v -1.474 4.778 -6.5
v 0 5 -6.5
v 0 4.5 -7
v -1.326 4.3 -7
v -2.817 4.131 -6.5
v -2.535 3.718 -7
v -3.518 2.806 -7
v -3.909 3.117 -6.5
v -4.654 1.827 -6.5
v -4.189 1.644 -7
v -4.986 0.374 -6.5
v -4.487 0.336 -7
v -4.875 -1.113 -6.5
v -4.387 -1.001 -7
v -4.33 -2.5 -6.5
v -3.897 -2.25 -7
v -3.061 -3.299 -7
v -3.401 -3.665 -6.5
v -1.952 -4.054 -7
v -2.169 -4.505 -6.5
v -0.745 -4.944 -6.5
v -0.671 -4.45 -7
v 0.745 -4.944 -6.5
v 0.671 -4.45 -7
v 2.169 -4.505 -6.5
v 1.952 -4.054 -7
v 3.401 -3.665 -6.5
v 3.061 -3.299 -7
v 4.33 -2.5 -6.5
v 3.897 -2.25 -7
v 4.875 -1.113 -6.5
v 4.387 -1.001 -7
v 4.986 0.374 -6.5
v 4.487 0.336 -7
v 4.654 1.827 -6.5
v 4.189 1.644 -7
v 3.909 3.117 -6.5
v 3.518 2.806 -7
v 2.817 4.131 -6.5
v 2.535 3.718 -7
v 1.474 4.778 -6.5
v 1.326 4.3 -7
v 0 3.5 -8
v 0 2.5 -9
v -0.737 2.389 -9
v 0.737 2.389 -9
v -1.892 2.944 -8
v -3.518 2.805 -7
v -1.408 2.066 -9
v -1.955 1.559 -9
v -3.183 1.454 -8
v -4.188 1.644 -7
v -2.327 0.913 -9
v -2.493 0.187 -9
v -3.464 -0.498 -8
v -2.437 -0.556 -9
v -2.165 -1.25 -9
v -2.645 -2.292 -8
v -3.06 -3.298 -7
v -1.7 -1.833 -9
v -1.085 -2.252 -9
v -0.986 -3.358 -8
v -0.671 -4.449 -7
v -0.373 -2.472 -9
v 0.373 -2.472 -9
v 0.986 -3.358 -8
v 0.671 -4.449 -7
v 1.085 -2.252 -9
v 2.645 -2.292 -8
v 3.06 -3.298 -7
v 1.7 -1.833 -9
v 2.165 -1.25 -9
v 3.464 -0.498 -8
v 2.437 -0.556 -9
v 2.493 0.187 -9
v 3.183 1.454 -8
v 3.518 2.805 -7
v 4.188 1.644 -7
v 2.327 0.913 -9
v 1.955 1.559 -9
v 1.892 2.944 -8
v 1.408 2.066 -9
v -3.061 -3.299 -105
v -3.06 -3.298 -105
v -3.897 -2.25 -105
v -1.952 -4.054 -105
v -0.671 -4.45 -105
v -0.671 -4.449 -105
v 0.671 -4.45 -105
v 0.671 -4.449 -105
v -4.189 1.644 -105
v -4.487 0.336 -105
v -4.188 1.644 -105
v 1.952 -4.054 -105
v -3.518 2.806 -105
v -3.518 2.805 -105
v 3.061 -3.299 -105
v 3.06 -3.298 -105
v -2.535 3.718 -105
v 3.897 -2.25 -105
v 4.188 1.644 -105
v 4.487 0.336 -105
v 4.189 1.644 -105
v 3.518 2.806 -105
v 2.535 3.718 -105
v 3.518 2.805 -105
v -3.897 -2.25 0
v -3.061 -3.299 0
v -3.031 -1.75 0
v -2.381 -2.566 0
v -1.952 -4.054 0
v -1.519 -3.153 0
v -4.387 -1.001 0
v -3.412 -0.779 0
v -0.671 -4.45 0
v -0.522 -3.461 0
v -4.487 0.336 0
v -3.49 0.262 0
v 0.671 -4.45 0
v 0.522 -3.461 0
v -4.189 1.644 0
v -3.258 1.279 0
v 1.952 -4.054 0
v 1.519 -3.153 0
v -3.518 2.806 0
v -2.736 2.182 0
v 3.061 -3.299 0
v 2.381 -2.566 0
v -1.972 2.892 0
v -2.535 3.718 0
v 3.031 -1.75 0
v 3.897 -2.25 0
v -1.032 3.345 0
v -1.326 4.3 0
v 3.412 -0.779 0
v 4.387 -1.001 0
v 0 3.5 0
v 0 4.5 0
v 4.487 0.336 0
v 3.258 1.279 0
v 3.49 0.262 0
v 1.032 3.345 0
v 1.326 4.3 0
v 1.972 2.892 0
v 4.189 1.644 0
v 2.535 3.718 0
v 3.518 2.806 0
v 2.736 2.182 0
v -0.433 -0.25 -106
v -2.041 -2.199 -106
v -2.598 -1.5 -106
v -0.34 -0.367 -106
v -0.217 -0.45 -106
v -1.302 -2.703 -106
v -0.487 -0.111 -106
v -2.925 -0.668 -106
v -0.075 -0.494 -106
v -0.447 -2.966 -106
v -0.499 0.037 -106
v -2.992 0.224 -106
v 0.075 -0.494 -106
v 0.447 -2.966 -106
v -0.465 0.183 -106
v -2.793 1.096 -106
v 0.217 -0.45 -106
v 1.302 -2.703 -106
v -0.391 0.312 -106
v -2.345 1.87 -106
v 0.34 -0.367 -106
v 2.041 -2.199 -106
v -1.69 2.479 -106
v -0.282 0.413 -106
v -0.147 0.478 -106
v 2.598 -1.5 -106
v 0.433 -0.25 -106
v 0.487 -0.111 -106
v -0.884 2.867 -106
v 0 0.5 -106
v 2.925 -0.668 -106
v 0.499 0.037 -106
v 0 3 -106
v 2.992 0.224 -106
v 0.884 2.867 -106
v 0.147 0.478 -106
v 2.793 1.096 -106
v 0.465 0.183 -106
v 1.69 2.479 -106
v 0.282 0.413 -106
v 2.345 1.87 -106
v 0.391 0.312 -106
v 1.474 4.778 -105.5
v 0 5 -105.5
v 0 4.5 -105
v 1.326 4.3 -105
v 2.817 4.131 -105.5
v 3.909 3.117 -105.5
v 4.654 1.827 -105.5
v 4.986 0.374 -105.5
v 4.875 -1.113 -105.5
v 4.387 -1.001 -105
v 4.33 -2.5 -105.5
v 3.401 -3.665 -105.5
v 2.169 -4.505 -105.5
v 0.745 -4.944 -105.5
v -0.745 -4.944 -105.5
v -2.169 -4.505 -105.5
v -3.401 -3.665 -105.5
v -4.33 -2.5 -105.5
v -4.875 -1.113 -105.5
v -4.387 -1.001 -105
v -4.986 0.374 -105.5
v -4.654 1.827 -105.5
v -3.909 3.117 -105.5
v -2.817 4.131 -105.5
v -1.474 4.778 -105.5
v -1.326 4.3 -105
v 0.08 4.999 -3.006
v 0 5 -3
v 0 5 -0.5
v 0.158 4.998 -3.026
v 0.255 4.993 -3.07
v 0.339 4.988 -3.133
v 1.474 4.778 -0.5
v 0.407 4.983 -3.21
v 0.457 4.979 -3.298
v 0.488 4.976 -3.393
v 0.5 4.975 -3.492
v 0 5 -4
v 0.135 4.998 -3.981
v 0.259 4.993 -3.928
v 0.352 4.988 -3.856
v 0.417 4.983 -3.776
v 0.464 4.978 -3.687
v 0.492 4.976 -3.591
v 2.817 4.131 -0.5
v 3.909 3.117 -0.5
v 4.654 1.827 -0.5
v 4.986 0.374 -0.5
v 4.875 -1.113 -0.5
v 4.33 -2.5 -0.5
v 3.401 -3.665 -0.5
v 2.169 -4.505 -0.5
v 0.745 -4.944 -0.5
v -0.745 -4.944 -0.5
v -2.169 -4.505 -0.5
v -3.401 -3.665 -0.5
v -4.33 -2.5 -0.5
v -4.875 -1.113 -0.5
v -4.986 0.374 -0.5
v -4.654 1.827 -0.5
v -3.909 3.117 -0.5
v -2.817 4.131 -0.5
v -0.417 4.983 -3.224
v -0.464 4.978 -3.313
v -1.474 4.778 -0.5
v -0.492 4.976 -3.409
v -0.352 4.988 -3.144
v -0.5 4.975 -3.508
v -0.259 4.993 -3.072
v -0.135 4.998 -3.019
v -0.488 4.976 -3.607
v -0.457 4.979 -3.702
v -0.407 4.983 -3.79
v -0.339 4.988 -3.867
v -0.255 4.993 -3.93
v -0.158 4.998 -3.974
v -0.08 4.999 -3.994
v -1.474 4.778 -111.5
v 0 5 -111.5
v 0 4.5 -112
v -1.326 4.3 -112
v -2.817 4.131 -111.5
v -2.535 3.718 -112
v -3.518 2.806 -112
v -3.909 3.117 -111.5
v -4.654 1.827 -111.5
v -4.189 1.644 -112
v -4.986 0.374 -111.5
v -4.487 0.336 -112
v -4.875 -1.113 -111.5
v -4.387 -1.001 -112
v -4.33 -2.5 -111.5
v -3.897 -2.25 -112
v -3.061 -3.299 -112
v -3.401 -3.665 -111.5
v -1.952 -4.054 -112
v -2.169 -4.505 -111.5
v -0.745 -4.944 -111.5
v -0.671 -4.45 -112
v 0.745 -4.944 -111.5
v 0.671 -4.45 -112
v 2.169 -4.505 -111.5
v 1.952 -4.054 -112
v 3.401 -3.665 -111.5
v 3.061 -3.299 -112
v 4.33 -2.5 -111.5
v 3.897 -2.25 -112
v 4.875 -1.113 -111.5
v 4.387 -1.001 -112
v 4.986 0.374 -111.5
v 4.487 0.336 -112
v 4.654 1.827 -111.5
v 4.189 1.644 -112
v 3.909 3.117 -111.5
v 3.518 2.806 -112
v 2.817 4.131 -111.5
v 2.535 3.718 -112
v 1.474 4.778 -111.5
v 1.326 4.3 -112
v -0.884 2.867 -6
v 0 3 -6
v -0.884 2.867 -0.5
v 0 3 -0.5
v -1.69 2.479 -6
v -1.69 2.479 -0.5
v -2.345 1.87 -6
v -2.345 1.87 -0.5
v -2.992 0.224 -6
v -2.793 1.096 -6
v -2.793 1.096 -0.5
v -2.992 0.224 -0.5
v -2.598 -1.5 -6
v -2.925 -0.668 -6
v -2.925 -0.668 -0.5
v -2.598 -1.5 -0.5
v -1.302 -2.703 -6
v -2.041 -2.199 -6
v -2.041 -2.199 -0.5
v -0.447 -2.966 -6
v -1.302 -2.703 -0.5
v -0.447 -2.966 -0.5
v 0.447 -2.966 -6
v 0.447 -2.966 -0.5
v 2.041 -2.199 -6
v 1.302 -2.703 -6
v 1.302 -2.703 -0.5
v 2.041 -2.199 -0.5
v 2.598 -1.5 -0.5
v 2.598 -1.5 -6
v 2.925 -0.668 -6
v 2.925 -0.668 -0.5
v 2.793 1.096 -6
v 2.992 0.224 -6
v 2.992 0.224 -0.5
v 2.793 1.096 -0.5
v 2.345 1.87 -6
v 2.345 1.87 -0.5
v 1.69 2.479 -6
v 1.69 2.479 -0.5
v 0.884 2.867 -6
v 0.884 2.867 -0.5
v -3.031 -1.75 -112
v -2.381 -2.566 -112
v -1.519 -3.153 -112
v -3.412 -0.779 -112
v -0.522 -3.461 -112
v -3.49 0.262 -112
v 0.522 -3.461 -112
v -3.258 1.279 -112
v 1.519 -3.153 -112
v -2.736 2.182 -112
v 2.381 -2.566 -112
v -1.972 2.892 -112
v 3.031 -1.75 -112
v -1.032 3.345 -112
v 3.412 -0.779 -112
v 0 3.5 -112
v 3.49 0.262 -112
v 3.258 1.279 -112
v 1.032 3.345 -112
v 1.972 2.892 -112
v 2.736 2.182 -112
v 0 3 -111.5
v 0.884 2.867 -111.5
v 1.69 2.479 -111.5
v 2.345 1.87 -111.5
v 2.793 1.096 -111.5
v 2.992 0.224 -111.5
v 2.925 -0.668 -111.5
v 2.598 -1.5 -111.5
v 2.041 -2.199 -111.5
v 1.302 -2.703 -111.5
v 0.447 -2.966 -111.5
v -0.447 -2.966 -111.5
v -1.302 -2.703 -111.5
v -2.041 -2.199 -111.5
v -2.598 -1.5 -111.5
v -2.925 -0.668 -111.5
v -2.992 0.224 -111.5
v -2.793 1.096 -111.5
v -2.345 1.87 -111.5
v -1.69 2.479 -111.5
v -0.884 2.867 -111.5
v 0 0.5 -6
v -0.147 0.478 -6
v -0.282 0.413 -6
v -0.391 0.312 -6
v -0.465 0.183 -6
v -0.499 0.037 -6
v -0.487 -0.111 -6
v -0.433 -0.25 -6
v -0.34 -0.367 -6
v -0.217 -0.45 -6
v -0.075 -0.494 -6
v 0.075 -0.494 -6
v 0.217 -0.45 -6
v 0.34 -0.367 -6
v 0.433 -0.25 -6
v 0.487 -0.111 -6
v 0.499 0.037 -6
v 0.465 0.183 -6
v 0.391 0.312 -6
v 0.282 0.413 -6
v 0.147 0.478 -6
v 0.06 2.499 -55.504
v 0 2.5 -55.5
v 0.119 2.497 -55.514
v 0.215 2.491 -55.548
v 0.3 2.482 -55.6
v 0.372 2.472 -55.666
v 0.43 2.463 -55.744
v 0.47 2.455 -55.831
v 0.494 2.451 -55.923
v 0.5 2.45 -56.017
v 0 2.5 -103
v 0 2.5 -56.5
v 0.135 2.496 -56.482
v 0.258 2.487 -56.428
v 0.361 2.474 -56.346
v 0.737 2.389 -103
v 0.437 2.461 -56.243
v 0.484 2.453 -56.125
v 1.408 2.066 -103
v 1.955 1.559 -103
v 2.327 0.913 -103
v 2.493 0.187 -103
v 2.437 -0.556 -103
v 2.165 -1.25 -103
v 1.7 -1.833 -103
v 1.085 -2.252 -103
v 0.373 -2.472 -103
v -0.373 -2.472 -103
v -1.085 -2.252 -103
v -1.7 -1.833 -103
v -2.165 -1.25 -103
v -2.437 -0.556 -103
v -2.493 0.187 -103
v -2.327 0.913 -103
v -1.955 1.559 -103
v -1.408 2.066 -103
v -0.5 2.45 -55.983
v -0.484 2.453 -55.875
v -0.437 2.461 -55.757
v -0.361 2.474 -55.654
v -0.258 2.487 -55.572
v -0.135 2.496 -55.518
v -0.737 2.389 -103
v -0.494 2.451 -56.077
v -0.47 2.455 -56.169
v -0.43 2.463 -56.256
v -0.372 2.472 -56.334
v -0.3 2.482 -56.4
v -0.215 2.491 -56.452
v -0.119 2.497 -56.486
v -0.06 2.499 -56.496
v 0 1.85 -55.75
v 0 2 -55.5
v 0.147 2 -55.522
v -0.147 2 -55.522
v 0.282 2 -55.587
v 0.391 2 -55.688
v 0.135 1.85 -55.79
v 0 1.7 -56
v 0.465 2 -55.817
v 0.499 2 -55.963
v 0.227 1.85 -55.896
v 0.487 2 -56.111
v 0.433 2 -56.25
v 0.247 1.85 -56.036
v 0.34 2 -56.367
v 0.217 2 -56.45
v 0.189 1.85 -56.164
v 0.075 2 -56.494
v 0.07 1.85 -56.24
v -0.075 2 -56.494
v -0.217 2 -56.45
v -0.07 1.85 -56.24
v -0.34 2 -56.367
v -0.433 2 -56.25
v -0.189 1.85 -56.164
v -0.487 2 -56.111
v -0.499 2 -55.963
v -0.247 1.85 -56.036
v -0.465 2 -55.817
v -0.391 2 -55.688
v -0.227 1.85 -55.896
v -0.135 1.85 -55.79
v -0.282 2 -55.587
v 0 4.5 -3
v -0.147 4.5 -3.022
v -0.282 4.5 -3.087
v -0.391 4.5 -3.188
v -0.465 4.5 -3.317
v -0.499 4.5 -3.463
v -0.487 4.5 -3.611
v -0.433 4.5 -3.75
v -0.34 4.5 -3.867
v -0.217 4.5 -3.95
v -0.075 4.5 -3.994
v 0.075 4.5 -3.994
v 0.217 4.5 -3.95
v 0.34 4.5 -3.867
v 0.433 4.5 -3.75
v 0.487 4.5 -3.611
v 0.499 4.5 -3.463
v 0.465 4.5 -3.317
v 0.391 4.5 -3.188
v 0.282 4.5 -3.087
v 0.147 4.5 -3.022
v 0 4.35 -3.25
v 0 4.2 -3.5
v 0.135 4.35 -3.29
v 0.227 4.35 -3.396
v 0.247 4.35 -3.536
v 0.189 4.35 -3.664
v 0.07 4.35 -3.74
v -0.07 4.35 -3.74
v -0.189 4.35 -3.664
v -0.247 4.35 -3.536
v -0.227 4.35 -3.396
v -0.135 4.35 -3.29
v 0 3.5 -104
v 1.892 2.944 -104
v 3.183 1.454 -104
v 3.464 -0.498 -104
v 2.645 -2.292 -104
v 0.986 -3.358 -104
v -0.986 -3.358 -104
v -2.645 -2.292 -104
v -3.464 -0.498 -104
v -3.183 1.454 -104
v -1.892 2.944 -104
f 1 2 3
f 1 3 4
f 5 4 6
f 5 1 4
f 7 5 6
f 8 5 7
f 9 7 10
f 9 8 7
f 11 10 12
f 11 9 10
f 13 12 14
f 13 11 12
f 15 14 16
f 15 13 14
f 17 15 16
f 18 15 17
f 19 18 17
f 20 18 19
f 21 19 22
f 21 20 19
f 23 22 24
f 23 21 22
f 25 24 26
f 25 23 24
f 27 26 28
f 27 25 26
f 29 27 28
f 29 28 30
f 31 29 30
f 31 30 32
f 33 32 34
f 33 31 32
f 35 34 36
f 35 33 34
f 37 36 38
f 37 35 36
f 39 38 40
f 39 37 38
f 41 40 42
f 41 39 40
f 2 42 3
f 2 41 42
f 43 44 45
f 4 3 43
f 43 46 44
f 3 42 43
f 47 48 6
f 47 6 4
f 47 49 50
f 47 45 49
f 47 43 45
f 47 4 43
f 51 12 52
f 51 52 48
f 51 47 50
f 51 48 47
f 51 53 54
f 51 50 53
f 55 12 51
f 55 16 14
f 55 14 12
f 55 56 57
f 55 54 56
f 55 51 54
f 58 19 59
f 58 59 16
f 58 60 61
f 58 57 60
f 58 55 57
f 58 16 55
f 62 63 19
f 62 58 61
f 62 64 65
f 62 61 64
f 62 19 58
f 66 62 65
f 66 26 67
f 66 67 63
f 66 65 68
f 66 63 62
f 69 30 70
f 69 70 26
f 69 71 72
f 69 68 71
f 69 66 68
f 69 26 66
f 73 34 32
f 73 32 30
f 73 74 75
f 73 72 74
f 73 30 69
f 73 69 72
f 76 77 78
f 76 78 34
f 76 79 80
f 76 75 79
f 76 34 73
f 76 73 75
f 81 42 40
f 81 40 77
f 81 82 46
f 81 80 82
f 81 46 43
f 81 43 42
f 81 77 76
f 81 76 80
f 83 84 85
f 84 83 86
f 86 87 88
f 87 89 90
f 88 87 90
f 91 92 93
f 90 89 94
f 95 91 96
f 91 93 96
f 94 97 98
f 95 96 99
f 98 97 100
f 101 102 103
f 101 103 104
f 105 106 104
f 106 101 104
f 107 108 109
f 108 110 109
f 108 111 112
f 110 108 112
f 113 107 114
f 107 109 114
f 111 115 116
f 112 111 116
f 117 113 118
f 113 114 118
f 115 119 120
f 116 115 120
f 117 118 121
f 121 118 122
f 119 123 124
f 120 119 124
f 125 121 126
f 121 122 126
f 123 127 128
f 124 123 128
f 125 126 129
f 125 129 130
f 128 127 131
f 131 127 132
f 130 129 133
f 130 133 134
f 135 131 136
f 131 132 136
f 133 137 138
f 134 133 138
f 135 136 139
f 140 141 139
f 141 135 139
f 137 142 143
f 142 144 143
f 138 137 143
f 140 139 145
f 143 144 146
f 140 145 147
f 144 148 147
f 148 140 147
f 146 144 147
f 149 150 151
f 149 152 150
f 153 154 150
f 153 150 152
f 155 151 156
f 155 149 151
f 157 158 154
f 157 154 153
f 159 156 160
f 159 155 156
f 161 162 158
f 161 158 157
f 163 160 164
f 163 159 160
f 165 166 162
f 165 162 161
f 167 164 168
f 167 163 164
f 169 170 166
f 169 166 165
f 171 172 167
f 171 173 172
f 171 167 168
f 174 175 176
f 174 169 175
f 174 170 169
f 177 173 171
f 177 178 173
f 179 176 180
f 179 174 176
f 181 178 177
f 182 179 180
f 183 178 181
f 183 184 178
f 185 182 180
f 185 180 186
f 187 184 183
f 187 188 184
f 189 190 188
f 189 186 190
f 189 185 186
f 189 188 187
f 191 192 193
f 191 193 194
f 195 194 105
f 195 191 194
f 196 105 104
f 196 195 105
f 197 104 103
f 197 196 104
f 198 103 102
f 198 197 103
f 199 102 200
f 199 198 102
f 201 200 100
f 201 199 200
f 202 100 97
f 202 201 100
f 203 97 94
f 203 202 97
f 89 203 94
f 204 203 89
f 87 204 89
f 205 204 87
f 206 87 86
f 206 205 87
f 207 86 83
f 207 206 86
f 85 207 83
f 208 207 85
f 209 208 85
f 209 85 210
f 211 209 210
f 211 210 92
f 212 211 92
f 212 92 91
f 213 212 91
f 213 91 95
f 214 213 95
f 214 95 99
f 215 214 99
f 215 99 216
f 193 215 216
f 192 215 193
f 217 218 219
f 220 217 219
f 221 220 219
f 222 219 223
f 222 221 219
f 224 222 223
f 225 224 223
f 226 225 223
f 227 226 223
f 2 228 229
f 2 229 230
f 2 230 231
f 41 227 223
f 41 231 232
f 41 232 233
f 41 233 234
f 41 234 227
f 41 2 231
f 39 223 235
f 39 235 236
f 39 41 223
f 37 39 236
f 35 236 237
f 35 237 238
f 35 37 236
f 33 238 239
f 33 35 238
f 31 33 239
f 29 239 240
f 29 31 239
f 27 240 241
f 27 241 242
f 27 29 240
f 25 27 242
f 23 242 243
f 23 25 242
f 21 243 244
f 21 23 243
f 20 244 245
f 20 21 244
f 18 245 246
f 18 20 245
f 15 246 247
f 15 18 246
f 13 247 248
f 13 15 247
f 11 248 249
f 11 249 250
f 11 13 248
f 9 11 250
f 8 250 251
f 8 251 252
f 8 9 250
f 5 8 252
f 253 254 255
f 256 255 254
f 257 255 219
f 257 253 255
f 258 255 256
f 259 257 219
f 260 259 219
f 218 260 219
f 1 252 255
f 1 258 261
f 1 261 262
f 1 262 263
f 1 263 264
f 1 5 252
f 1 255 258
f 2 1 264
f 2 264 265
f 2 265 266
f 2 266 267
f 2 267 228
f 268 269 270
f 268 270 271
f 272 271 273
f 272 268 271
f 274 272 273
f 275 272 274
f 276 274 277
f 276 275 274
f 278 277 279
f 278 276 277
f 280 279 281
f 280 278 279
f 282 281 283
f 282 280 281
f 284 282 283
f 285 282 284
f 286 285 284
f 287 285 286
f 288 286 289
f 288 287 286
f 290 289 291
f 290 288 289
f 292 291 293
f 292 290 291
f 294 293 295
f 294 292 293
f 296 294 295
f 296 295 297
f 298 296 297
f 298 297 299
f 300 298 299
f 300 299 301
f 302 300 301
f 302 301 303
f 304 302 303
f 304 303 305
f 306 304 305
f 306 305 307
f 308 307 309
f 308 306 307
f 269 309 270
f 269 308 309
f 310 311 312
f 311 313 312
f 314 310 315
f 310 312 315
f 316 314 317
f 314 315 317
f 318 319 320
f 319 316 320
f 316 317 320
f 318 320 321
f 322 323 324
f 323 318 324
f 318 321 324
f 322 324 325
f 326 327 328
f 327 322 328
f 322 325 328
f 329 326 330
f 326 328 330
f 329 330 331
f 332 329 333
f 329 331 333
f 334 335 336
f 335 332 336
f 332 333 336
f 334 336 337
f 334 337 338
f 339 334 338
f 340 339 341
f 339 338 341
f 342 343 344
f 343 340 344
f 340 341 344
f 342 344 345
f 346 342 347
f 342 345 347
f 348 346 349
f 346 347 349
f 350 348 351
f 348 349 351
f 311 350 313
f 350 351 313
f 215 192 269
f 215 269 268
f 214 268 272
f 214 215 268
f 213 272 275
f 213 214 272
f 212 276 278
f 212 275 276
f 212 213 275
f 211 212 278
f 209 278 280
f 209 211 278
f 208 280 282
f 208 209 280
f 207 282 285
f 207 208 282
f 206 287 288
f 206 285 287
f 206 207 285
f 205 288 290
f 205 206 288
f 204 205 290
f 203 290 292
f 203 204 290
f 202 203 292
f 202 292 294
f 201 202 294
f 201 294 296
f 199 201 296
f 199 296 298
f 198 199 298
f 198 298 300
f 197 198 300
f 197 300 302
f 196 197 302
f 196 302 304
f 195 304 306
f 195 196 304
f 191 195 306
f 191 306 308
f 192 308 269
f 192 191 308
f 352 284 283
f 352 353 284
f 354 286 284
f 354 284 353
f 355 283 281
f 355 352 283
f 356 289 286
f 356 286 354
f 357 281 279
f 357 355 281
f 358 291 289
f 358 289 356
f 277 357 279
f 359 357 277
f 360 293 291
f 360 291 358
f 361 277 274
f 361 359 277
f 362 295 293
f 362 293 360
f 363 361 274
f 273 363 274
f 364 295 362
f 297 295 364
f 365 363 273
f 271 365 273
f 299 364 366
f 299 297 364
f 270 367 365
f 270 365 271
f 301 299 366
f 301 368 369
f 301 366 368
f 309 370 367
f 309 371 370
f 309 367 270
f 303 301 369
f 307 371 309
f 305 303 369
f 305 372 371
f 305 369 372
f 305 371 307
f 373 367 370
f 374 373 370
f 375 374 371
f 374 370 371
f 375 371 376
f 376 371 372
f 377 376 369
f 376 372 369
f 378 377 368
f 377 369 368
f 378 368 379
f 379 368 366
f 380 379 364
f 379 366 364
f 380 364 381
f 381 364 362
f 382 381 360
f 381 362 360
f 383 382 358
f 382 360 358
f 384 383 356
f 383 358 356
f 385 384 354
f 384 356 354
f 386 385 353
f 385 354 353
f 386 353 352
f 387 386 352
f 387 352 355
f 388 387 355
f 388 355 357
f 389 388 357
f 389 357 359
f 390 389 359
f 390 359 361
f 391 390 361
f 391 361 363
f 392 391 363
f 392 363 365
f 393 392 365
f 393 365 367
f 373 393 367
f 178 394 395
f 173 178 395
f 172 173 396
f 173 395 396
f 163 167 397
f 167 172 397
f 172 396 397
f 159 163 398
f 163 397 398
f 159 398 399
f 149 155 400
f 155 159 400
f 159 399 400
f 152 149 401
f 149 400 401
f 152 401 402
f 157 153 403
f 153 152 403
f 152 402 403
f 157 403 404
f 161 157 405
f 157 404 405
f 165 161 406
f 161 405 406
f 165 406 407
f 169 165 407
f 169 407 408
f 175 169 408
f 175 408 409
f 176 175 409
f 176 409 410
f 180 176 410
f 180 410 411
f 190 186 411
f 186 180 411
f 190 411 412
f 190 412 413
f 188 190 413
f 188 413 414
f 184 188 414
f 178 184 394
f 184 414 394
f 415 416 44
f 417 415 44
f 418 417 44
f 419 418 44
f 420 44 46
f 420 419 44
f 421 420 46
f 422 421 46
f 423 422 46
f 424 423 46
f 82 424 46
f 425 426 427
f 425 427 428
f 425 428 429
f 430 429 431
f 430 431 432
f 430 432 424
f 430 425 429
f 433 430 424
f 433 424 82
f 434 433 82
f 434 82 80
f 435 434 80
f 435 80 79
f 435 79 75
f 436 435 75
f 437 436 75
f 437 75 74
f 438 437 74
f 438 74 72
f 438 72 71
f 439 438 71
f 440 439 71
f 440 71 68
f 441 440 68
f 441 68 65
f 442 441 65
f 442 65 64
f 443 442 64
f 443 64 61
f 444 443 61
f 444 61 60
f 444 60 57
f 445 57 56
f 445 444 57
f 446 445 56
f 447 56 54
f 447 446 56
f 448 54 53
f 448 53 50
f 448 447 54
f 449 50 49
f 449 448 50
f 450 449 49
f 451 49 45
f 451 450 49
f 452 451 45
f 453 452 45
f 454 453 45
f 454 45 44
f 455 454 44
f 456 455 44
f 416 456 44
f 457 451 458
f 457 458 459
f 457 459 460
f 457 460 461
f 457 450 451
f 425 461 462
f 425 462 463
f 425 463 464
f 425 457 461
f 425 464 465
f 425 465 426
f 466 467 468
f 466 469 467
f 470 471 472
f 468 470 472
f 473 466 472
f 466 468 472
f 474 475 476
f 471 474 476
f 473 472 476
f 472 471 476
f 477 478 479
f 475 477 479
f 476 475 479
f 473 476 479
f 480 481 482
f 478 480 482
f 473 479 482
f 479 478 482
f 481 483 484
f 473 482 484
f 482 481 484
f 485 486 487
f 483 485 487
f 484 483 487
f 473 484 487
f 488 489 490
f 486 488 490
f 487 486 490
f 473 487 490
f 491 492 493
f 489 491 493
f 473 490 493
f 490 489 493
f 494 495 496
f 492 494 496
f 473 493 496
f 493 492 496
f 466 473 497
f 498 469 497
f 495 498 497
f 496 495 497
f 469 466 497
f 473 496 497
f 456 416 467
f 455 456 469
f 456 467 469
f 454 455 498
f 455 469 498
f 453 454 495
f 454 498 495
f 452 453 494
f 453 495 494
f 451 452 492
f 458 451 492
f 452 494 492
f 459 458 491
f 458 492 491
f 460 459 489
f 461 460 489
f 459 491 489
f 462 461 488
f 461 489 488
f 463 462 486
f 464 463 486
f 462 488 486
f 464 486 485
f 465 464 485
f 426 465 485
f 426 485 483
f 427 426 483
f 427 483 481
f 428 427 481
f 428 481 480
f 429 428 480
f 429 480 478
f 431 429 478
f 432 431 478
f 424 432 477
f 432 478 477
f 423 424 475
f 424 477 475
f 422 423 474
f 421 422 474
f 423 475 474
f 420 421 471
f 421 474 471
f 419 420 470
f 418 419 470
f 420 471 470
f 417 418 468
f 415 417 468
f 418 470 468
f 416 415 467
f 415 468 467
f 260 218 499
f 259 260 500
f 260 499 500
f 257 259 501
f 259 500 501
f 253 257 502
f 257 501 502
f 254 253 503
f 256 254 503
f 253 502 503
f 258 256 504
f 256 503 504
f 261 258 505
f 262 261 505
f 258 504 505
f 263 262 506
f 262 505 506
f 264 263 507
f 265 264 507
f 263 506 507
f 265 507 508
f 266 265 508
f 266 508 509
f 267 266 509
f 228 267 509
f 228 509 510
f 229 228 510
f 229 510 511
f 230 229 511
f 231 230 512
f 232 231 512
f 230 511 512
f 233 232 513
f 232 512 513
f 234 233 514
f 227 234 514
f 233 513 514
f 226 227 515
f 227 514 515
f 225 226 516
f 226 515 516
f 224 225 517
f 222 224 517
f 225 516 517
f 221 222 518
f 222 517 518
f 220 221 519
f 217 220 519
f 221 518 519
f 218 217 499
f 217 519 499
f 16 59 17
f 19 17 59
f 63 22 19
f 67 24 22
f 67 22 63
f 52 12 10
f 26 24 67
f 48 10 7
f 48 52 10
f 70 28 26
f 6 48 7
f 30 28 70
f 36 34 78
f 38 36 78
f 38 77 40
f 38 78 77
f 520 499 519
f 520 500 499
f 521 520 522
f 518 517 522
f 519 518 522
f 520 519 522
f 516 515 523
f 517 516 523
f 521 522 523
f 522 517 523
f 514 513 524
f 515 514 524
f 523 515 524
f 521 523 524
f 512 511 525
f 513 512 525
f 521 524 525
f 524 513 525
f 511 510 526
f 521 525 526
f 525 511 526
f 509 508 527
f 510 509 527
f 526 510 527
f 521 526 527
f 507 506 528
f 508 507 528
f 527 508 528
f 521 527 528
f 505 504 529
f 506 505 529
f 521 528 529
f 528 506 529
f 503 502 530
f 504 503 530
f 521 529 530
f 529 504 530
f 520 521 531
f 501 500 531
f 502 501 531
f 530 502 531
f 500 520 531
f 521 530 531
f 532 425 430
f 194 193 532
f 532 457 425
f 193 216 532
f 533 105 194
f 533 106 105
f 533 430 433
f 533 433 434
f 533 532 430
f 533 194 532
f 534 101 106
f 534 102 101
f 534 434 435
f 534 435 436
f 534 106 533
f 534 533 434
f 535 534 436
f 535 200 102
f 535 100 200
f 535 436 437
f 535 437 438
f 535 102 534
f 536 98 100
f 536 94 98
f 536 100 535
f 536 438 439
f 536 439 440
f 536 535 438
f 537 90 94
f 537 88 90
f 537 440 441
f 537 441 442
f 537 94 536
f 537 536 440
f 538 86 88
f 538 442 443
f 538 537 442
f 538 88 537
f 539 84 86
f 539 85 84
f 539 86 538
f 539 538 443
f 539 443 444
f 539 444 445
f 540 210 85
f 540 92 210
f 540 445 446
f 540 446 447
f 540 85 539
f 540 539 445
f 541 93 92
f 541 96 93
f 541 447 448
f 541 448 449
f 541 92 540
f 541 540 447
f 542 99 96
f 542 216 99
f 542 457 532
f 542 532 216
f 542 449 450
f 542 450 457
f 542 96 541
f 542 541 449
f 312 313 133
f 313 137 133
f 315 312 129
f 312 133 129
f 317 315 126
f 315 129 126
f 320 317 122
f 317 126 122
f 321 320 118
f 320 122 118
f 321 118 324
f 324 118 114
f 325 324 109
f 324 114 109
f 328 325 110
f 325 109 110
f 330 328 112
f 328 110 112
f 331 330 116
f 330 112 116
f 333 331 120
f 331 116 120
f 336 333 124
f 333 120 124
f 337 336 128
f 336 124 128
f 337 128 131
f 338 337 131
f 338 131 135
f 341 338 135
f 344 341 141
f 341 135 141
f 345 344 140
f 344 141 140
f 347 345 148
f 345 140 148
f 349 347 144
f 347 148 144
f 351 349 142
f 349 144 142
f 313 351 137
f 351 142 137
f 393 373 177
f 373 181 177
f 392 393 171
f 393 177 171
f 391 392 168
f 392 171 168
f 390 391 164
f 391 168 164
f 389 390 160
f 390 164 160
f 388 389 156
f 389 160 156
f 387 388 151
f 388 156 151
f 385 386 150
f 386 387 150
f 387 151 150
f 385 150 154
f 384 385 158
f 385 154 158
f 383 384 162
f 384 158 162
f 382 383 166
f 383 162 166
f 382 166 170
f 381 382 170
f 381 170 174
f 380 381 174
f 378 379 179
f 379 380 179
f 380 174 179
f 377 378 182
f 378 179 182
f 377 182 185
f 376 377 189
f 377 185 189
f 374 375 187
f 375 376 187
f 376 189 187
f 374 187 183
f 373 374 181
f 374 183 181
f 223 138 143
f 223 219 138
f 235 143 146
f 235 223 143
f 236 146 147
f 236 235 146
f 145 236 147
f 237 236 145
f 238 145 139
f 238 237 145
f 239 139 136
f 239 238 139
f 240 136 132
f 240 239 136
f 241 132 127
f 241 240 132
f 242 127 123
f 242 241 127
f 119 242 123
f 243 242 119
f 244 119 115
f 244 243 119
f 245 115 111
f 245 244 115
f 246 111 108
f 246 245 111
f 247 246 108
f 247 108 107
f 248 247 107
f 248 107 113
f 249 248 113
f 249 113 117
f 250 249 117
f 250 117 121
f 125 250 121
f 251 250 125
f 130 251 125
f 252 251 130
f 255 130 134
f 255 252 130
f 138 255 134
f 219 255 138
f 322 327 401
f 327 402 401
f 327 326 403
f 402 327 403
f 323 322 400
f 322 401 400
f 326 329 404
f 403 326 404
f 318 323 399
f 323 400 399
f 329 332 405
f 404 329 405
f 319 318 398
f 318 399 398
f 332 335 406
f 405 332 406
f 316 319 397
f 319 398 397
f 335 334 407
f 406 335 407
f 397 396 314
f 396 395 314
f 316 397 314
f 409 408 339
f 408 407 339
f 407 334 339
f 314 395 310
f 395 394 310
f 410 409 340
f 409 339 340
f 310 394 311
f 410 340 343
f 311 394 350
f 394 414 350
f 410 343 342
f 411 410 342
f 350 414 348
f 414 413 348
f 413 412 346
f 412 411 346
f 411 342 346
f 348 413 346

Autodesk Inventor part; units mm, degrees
ref_plane "YZ Plane" through (0, 0, 0) normal (1, 0, 0) x (0, 1, 0)
sketch "Sketch1" plane through (0, 0, 0) normal (1, 0, 0) x (0, 1, 0)
  line L0 (0, 0) -> (0, -112)
  line L1 (0, -112) -> (3, -112)
  line L2 (3, -112) -> (3, 0)
  line L3 (3, 0) -> (0, 0)
  line L4 (3, 0) -> (3, -6)
  line L5 (3, -112) -> (3, -106)
  line L6 (3, -112) -> (5, -112)
  line L7 (5, -112) -> (5, -106)
  line L8 (5, -106) -> (3, -106)
  line L9 (3, 0) -> (5, 0)
  line L10 (5, 0) -> (5, -6)
  line L11 (5, -6) -> (3, -6)
  line L12 (3, -106) -> (0.5, -106)
  line L13 (0.5, -106) -> (0.5, -6)
  line L14 (0.5, -6) -> (3, -6)
  line L15 (5, -6) -> (5, -7)
  line L16 (5, -7) -> (0.5, -7)
  line L17 (5, -106) -> (5, -105)
  line L18 (5, -105) -> (0.5, -105)
  line L19 (3, -7) -> (3.1, -7)
  line L20 (2.5, -7) -> (2.5, -105)
  point P0 (3, -105)
  point P1 (2, -6)
  point P2 (3.1, -105)
  dimension "d0" = 112
  dimension "d1" = 3
  dimension "d2" = 6
  dimension "d3" = 6
  dimension "d5" = 2
  dimension "d6" = 2
  dimension "d7" = 2.5
  dimension "d8" = 1
  dimension "d9" = 1
  dimension "d22" = 2
revolve "Revolution1" add sketch "Sketch1" angle 360 about axis through (0, 0, 0) along (0, 0, -1) contours L9 L10 L11 L2 | L2 L8 L7 L6 | L11 L15 L16 L2 | L2 L16 L13 L14 | L12 L13 L18 L2 | L2 L18 L17 L8 | L20 L18 L13 L16
thread "Thread1" size "M6x1" class "6H" standard "ANSI Metric M Profile" full length
thread "Thread2" size "M6x1" class "6H" standard "ANSI Metric M Profile" full length
chamfer "Chamfer1" distance 0.5 angle 45 2 edges at (0, -3, 0) (0, -3, -112)
chamfer "Chamfer2" distance 0.5 angle 45 4 edges at (0, -5, -112) (0, -5, -105) (0, -5, -7) (0, -5, 0)
chamfer "Chamfer3" distance 2 angle 45 2 edges at (0, -2.5, -7) (0, -2.5, -105)
ref_plane "Work Plane1" through (0, 5, -3.5) normal (0, 1, 0) x (-1, 0, 0)
ref_plane "Work Plane2" through (0, 2.5, -56) normal (0, 1, 0) x (-1, 0, 0)
sketch "Sketch2" plane through (0, 5, -3.5) normal (0, 1, 0) x (-1, 0, 0)
  point P0 (0, 3.5)
  point P1 (0, 0)
  point P2 (0, 0)
sketch "Sketch3" plane through (0, 2.5, -56) normal (0, 1, 0) x (-1, 0, 0)
  point P0 (0, 56)
  point P1 (0, 0)
hole "Hole1" at (0, 5, -3.5) direction (0, -1, 0) diameter 1 depth 0.5 tip angle 118
hole "Hole2" at (0, 2.5, -56) direction (0, -1, 0) diameter 1 depth 0.5 tip angle 118
properties part number "Heater"
